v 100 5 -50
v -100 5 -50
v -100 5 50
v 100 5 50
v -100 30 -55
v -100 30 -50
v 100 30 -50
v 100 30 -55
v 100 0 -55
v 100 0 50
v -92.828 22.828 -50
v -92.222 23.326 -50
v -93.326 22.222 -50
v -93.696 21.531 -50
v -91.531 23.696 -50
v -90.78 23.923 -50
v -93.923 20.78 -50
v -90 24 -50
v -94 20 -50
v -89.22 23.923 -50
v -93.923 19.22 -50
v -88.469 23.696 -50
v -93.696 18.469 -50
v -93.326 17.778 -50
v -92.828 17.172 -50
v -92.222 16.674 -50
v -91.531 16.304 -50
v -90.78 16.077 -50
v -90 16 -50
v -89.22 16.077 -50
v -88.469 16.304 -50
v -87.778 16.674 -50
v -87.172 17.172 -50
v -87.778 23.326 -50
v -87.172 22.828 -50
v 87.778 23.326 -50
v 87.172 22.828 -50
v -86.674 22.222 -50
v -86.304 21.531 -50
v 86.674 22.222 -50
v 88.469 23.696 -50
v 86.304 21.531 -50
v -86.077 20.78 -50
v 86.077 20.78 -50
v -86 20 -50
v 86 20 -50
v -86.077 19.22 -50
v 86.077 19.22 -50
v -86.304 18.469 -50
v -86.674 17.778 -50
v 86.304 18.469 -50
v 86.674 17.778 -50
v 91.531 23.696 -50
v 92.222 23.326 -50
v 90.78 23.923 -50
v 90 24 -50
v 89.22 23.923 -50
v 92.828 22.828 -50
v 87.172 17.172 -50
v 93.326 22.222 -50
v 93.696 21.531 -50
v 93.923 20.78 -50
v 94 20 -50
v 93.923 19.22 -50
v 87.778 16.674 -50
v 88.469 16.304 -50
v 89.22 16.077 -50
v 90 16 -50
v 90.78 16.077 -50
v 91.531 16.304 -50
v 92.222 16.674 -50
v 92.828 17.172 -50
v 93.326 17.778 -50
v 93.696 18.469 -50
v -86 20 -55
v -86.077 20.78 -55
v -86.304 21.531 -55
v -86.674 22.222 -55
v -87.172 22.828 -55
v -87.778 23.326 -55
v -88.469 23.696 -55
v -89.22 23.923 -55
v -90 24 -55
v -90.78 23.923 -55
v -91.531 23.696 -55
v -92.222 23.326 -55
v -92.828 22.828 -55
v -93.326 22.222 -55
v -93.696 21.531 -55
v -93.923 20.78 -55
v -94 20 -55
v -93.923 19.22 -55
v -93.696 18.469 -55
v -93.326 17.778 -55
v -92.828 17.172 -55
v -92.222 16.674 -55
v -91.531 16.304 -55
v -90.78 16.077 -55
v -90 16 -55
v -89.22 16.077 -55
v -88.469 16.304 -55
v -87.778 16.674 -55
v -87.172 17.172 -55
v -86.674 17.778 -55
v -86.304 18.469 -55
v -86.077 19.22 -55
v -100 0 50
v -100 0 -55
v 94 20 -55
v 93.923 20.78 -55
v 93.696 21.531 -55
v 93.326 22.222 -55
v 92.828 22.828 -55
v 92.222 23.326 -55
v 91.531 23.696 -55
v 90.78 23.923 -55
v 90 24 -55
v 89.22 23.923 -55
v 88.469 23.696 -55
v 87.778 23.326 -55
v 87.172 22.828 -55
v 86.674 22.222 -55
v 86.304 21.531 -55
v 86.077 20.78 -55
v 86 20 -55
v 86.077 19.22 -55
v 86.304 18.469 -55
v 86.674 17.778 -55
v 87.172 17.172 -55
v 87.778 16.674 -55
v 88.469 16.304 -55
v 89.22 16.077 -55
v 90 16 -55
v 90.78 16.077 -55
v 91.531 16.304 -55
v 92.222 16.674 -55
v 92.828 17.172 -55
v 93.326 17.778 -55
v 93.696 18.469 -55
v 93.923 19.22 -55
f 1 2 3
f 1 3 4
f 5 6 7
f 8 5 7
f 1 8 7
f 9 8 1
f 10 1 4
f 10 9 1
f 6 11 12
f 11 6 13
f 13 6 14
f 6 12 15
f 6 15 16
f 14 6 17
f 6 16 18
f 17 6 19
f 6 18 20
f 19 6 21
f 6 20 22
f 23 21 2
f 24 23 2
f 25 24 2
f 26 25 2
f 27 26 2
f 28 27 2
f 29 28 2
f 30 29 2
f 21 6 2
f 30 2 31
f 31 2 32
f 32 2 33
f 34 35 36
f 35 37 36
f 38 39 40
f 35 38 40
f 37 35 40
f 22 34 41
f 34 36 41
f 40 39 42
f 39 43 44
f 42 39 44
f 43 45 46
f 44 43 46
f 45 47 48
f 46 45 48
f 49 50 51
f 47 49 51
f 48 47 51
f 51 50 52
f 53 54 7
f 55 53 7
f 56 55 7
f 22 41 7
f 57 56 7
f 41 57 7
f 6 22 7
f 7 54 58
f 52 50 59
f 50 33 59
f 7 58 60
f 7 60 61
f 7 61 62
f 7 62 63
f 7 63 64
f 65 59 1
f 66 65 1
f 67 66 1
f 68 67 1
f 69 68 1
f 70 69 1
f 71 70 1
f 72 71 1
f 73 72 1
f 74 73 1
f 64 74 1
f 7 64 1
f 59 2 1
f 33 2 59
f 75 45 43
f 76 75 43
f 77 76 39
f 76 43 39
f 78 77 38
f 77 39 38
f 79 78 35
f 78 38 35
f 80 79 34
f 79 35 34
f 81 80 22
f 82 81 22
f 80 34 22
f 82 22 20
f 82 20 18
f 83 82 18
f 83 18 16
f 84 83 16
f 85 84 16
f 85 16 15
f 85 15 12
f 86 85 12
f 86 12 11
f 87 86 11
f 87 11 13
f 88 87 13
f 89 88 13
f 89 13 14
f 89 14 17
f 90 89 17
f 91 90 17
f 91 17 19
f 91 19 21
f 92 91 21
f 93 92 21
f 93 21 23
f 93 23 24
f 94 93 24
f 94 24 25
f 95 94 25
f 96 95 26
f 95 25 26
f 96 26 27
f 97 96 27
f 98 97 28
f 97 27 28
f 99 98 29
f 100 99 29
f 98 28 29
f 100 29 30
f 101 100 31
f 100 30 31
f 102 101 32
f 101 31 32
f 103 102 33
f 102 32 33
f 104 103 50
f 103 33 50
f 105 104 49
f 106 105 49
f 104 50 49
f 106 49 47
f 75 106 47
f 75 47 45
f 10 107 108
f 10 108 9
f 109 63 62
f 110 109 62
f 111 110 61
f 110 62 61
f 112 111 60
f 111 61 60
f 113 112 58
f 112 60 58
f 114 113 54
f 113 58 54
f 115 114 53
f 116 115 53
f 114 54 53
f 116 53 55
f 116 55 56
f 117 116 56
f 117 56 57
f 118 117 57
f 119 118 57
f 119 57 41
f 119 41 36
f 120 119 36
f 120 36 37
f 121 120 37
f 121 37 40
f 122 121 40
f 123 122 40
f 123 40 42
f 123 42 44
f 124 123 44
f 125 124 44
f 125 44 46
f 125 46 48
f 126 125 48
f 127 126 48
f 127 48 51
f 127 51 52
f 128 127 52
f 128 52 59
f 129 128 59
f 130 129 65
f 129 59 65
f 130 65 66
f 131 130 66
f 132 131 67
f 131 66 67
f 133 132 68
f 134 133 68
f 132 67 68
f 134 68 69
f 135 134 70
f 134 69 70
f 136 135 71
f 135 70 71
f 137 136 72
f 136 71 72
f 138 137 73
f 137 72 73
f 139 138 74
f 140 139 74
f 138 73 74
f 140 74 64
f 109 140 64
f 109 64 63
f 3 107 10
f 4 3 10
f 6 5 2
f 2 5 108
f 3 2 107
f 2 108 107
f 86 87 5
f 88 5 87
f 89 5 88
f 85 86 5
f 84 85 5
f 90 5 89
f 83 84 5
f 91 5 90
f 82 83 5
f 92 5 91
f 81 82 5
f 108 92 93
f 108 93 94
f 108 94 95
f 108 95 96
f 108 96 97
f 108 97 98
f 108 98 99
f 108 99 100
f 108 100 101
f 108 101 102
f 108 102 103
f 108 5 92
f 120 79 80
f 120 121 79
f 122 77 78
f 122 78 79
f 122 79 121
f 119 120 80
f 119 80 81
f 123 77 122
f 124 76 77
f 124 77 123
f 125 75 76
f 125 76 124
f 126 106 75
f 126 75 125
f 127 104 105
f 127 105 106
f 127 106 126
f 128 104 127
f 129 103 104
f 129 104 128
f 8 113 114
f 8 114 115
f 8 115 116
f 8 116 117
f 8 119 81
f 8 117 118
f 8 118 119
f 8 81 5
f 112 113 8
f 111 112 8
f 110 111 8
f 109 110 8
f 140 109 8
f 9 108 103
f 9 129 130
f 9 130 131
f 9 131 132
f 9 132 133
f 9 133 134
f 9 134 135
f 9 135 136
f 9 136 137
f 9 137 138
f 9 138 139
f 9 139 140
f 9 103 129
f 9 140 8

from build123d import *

# Parameters (mm, degrees)
SKETCH1_W           = 200
SKETCH1_H           = 100
BOSS_EXTRUDE1_DEPTH = 5
SKETCH2_W           = 200
SKETCH2_H           = 5
BOSS_EXTRUDE2_DEPTH = 30
SKETCH3_R           = 4
CUT_EXTRUDE1_DEPTH  = 40


with BuildPart() as part:
    # Sketch1 → Boss-Extrude1 (new body)
    with BuildSketch(Plane(origin=(0, 0, 0), x_dir=(1, 0, 0), z_dir=(0, 1, 0))):
        Rectangle(SKETCH1_W, SKETCH1_H)
    extrude(amount=BOSS_EXTRUDE1_DEPTH)

    # Sketch2 → Boss-Extrude2 (add)
    with BuildSketch(Plane.XZ):
        with Locations((0, -52.5)):
            Rectangle(SKETCH2_W, SKETCH2_H)
    extrude(amount=-BOSS_EXTRUDE2_DEPTH)

    # Sketch3 → Cut-Extrude1 (cut)
    with BuildSketch(Plane.XY.offset(-50)):
        with Locations((-90, 20)):
            Circle(SKETCH3_R)
        with Locations((90, 20)):
            Circle(SKETCH3_R)
    extrude(amount=-CUT_EXTRUDE1_DEPTH, mode=Mode.SUBTRACT)


solid = part.part
